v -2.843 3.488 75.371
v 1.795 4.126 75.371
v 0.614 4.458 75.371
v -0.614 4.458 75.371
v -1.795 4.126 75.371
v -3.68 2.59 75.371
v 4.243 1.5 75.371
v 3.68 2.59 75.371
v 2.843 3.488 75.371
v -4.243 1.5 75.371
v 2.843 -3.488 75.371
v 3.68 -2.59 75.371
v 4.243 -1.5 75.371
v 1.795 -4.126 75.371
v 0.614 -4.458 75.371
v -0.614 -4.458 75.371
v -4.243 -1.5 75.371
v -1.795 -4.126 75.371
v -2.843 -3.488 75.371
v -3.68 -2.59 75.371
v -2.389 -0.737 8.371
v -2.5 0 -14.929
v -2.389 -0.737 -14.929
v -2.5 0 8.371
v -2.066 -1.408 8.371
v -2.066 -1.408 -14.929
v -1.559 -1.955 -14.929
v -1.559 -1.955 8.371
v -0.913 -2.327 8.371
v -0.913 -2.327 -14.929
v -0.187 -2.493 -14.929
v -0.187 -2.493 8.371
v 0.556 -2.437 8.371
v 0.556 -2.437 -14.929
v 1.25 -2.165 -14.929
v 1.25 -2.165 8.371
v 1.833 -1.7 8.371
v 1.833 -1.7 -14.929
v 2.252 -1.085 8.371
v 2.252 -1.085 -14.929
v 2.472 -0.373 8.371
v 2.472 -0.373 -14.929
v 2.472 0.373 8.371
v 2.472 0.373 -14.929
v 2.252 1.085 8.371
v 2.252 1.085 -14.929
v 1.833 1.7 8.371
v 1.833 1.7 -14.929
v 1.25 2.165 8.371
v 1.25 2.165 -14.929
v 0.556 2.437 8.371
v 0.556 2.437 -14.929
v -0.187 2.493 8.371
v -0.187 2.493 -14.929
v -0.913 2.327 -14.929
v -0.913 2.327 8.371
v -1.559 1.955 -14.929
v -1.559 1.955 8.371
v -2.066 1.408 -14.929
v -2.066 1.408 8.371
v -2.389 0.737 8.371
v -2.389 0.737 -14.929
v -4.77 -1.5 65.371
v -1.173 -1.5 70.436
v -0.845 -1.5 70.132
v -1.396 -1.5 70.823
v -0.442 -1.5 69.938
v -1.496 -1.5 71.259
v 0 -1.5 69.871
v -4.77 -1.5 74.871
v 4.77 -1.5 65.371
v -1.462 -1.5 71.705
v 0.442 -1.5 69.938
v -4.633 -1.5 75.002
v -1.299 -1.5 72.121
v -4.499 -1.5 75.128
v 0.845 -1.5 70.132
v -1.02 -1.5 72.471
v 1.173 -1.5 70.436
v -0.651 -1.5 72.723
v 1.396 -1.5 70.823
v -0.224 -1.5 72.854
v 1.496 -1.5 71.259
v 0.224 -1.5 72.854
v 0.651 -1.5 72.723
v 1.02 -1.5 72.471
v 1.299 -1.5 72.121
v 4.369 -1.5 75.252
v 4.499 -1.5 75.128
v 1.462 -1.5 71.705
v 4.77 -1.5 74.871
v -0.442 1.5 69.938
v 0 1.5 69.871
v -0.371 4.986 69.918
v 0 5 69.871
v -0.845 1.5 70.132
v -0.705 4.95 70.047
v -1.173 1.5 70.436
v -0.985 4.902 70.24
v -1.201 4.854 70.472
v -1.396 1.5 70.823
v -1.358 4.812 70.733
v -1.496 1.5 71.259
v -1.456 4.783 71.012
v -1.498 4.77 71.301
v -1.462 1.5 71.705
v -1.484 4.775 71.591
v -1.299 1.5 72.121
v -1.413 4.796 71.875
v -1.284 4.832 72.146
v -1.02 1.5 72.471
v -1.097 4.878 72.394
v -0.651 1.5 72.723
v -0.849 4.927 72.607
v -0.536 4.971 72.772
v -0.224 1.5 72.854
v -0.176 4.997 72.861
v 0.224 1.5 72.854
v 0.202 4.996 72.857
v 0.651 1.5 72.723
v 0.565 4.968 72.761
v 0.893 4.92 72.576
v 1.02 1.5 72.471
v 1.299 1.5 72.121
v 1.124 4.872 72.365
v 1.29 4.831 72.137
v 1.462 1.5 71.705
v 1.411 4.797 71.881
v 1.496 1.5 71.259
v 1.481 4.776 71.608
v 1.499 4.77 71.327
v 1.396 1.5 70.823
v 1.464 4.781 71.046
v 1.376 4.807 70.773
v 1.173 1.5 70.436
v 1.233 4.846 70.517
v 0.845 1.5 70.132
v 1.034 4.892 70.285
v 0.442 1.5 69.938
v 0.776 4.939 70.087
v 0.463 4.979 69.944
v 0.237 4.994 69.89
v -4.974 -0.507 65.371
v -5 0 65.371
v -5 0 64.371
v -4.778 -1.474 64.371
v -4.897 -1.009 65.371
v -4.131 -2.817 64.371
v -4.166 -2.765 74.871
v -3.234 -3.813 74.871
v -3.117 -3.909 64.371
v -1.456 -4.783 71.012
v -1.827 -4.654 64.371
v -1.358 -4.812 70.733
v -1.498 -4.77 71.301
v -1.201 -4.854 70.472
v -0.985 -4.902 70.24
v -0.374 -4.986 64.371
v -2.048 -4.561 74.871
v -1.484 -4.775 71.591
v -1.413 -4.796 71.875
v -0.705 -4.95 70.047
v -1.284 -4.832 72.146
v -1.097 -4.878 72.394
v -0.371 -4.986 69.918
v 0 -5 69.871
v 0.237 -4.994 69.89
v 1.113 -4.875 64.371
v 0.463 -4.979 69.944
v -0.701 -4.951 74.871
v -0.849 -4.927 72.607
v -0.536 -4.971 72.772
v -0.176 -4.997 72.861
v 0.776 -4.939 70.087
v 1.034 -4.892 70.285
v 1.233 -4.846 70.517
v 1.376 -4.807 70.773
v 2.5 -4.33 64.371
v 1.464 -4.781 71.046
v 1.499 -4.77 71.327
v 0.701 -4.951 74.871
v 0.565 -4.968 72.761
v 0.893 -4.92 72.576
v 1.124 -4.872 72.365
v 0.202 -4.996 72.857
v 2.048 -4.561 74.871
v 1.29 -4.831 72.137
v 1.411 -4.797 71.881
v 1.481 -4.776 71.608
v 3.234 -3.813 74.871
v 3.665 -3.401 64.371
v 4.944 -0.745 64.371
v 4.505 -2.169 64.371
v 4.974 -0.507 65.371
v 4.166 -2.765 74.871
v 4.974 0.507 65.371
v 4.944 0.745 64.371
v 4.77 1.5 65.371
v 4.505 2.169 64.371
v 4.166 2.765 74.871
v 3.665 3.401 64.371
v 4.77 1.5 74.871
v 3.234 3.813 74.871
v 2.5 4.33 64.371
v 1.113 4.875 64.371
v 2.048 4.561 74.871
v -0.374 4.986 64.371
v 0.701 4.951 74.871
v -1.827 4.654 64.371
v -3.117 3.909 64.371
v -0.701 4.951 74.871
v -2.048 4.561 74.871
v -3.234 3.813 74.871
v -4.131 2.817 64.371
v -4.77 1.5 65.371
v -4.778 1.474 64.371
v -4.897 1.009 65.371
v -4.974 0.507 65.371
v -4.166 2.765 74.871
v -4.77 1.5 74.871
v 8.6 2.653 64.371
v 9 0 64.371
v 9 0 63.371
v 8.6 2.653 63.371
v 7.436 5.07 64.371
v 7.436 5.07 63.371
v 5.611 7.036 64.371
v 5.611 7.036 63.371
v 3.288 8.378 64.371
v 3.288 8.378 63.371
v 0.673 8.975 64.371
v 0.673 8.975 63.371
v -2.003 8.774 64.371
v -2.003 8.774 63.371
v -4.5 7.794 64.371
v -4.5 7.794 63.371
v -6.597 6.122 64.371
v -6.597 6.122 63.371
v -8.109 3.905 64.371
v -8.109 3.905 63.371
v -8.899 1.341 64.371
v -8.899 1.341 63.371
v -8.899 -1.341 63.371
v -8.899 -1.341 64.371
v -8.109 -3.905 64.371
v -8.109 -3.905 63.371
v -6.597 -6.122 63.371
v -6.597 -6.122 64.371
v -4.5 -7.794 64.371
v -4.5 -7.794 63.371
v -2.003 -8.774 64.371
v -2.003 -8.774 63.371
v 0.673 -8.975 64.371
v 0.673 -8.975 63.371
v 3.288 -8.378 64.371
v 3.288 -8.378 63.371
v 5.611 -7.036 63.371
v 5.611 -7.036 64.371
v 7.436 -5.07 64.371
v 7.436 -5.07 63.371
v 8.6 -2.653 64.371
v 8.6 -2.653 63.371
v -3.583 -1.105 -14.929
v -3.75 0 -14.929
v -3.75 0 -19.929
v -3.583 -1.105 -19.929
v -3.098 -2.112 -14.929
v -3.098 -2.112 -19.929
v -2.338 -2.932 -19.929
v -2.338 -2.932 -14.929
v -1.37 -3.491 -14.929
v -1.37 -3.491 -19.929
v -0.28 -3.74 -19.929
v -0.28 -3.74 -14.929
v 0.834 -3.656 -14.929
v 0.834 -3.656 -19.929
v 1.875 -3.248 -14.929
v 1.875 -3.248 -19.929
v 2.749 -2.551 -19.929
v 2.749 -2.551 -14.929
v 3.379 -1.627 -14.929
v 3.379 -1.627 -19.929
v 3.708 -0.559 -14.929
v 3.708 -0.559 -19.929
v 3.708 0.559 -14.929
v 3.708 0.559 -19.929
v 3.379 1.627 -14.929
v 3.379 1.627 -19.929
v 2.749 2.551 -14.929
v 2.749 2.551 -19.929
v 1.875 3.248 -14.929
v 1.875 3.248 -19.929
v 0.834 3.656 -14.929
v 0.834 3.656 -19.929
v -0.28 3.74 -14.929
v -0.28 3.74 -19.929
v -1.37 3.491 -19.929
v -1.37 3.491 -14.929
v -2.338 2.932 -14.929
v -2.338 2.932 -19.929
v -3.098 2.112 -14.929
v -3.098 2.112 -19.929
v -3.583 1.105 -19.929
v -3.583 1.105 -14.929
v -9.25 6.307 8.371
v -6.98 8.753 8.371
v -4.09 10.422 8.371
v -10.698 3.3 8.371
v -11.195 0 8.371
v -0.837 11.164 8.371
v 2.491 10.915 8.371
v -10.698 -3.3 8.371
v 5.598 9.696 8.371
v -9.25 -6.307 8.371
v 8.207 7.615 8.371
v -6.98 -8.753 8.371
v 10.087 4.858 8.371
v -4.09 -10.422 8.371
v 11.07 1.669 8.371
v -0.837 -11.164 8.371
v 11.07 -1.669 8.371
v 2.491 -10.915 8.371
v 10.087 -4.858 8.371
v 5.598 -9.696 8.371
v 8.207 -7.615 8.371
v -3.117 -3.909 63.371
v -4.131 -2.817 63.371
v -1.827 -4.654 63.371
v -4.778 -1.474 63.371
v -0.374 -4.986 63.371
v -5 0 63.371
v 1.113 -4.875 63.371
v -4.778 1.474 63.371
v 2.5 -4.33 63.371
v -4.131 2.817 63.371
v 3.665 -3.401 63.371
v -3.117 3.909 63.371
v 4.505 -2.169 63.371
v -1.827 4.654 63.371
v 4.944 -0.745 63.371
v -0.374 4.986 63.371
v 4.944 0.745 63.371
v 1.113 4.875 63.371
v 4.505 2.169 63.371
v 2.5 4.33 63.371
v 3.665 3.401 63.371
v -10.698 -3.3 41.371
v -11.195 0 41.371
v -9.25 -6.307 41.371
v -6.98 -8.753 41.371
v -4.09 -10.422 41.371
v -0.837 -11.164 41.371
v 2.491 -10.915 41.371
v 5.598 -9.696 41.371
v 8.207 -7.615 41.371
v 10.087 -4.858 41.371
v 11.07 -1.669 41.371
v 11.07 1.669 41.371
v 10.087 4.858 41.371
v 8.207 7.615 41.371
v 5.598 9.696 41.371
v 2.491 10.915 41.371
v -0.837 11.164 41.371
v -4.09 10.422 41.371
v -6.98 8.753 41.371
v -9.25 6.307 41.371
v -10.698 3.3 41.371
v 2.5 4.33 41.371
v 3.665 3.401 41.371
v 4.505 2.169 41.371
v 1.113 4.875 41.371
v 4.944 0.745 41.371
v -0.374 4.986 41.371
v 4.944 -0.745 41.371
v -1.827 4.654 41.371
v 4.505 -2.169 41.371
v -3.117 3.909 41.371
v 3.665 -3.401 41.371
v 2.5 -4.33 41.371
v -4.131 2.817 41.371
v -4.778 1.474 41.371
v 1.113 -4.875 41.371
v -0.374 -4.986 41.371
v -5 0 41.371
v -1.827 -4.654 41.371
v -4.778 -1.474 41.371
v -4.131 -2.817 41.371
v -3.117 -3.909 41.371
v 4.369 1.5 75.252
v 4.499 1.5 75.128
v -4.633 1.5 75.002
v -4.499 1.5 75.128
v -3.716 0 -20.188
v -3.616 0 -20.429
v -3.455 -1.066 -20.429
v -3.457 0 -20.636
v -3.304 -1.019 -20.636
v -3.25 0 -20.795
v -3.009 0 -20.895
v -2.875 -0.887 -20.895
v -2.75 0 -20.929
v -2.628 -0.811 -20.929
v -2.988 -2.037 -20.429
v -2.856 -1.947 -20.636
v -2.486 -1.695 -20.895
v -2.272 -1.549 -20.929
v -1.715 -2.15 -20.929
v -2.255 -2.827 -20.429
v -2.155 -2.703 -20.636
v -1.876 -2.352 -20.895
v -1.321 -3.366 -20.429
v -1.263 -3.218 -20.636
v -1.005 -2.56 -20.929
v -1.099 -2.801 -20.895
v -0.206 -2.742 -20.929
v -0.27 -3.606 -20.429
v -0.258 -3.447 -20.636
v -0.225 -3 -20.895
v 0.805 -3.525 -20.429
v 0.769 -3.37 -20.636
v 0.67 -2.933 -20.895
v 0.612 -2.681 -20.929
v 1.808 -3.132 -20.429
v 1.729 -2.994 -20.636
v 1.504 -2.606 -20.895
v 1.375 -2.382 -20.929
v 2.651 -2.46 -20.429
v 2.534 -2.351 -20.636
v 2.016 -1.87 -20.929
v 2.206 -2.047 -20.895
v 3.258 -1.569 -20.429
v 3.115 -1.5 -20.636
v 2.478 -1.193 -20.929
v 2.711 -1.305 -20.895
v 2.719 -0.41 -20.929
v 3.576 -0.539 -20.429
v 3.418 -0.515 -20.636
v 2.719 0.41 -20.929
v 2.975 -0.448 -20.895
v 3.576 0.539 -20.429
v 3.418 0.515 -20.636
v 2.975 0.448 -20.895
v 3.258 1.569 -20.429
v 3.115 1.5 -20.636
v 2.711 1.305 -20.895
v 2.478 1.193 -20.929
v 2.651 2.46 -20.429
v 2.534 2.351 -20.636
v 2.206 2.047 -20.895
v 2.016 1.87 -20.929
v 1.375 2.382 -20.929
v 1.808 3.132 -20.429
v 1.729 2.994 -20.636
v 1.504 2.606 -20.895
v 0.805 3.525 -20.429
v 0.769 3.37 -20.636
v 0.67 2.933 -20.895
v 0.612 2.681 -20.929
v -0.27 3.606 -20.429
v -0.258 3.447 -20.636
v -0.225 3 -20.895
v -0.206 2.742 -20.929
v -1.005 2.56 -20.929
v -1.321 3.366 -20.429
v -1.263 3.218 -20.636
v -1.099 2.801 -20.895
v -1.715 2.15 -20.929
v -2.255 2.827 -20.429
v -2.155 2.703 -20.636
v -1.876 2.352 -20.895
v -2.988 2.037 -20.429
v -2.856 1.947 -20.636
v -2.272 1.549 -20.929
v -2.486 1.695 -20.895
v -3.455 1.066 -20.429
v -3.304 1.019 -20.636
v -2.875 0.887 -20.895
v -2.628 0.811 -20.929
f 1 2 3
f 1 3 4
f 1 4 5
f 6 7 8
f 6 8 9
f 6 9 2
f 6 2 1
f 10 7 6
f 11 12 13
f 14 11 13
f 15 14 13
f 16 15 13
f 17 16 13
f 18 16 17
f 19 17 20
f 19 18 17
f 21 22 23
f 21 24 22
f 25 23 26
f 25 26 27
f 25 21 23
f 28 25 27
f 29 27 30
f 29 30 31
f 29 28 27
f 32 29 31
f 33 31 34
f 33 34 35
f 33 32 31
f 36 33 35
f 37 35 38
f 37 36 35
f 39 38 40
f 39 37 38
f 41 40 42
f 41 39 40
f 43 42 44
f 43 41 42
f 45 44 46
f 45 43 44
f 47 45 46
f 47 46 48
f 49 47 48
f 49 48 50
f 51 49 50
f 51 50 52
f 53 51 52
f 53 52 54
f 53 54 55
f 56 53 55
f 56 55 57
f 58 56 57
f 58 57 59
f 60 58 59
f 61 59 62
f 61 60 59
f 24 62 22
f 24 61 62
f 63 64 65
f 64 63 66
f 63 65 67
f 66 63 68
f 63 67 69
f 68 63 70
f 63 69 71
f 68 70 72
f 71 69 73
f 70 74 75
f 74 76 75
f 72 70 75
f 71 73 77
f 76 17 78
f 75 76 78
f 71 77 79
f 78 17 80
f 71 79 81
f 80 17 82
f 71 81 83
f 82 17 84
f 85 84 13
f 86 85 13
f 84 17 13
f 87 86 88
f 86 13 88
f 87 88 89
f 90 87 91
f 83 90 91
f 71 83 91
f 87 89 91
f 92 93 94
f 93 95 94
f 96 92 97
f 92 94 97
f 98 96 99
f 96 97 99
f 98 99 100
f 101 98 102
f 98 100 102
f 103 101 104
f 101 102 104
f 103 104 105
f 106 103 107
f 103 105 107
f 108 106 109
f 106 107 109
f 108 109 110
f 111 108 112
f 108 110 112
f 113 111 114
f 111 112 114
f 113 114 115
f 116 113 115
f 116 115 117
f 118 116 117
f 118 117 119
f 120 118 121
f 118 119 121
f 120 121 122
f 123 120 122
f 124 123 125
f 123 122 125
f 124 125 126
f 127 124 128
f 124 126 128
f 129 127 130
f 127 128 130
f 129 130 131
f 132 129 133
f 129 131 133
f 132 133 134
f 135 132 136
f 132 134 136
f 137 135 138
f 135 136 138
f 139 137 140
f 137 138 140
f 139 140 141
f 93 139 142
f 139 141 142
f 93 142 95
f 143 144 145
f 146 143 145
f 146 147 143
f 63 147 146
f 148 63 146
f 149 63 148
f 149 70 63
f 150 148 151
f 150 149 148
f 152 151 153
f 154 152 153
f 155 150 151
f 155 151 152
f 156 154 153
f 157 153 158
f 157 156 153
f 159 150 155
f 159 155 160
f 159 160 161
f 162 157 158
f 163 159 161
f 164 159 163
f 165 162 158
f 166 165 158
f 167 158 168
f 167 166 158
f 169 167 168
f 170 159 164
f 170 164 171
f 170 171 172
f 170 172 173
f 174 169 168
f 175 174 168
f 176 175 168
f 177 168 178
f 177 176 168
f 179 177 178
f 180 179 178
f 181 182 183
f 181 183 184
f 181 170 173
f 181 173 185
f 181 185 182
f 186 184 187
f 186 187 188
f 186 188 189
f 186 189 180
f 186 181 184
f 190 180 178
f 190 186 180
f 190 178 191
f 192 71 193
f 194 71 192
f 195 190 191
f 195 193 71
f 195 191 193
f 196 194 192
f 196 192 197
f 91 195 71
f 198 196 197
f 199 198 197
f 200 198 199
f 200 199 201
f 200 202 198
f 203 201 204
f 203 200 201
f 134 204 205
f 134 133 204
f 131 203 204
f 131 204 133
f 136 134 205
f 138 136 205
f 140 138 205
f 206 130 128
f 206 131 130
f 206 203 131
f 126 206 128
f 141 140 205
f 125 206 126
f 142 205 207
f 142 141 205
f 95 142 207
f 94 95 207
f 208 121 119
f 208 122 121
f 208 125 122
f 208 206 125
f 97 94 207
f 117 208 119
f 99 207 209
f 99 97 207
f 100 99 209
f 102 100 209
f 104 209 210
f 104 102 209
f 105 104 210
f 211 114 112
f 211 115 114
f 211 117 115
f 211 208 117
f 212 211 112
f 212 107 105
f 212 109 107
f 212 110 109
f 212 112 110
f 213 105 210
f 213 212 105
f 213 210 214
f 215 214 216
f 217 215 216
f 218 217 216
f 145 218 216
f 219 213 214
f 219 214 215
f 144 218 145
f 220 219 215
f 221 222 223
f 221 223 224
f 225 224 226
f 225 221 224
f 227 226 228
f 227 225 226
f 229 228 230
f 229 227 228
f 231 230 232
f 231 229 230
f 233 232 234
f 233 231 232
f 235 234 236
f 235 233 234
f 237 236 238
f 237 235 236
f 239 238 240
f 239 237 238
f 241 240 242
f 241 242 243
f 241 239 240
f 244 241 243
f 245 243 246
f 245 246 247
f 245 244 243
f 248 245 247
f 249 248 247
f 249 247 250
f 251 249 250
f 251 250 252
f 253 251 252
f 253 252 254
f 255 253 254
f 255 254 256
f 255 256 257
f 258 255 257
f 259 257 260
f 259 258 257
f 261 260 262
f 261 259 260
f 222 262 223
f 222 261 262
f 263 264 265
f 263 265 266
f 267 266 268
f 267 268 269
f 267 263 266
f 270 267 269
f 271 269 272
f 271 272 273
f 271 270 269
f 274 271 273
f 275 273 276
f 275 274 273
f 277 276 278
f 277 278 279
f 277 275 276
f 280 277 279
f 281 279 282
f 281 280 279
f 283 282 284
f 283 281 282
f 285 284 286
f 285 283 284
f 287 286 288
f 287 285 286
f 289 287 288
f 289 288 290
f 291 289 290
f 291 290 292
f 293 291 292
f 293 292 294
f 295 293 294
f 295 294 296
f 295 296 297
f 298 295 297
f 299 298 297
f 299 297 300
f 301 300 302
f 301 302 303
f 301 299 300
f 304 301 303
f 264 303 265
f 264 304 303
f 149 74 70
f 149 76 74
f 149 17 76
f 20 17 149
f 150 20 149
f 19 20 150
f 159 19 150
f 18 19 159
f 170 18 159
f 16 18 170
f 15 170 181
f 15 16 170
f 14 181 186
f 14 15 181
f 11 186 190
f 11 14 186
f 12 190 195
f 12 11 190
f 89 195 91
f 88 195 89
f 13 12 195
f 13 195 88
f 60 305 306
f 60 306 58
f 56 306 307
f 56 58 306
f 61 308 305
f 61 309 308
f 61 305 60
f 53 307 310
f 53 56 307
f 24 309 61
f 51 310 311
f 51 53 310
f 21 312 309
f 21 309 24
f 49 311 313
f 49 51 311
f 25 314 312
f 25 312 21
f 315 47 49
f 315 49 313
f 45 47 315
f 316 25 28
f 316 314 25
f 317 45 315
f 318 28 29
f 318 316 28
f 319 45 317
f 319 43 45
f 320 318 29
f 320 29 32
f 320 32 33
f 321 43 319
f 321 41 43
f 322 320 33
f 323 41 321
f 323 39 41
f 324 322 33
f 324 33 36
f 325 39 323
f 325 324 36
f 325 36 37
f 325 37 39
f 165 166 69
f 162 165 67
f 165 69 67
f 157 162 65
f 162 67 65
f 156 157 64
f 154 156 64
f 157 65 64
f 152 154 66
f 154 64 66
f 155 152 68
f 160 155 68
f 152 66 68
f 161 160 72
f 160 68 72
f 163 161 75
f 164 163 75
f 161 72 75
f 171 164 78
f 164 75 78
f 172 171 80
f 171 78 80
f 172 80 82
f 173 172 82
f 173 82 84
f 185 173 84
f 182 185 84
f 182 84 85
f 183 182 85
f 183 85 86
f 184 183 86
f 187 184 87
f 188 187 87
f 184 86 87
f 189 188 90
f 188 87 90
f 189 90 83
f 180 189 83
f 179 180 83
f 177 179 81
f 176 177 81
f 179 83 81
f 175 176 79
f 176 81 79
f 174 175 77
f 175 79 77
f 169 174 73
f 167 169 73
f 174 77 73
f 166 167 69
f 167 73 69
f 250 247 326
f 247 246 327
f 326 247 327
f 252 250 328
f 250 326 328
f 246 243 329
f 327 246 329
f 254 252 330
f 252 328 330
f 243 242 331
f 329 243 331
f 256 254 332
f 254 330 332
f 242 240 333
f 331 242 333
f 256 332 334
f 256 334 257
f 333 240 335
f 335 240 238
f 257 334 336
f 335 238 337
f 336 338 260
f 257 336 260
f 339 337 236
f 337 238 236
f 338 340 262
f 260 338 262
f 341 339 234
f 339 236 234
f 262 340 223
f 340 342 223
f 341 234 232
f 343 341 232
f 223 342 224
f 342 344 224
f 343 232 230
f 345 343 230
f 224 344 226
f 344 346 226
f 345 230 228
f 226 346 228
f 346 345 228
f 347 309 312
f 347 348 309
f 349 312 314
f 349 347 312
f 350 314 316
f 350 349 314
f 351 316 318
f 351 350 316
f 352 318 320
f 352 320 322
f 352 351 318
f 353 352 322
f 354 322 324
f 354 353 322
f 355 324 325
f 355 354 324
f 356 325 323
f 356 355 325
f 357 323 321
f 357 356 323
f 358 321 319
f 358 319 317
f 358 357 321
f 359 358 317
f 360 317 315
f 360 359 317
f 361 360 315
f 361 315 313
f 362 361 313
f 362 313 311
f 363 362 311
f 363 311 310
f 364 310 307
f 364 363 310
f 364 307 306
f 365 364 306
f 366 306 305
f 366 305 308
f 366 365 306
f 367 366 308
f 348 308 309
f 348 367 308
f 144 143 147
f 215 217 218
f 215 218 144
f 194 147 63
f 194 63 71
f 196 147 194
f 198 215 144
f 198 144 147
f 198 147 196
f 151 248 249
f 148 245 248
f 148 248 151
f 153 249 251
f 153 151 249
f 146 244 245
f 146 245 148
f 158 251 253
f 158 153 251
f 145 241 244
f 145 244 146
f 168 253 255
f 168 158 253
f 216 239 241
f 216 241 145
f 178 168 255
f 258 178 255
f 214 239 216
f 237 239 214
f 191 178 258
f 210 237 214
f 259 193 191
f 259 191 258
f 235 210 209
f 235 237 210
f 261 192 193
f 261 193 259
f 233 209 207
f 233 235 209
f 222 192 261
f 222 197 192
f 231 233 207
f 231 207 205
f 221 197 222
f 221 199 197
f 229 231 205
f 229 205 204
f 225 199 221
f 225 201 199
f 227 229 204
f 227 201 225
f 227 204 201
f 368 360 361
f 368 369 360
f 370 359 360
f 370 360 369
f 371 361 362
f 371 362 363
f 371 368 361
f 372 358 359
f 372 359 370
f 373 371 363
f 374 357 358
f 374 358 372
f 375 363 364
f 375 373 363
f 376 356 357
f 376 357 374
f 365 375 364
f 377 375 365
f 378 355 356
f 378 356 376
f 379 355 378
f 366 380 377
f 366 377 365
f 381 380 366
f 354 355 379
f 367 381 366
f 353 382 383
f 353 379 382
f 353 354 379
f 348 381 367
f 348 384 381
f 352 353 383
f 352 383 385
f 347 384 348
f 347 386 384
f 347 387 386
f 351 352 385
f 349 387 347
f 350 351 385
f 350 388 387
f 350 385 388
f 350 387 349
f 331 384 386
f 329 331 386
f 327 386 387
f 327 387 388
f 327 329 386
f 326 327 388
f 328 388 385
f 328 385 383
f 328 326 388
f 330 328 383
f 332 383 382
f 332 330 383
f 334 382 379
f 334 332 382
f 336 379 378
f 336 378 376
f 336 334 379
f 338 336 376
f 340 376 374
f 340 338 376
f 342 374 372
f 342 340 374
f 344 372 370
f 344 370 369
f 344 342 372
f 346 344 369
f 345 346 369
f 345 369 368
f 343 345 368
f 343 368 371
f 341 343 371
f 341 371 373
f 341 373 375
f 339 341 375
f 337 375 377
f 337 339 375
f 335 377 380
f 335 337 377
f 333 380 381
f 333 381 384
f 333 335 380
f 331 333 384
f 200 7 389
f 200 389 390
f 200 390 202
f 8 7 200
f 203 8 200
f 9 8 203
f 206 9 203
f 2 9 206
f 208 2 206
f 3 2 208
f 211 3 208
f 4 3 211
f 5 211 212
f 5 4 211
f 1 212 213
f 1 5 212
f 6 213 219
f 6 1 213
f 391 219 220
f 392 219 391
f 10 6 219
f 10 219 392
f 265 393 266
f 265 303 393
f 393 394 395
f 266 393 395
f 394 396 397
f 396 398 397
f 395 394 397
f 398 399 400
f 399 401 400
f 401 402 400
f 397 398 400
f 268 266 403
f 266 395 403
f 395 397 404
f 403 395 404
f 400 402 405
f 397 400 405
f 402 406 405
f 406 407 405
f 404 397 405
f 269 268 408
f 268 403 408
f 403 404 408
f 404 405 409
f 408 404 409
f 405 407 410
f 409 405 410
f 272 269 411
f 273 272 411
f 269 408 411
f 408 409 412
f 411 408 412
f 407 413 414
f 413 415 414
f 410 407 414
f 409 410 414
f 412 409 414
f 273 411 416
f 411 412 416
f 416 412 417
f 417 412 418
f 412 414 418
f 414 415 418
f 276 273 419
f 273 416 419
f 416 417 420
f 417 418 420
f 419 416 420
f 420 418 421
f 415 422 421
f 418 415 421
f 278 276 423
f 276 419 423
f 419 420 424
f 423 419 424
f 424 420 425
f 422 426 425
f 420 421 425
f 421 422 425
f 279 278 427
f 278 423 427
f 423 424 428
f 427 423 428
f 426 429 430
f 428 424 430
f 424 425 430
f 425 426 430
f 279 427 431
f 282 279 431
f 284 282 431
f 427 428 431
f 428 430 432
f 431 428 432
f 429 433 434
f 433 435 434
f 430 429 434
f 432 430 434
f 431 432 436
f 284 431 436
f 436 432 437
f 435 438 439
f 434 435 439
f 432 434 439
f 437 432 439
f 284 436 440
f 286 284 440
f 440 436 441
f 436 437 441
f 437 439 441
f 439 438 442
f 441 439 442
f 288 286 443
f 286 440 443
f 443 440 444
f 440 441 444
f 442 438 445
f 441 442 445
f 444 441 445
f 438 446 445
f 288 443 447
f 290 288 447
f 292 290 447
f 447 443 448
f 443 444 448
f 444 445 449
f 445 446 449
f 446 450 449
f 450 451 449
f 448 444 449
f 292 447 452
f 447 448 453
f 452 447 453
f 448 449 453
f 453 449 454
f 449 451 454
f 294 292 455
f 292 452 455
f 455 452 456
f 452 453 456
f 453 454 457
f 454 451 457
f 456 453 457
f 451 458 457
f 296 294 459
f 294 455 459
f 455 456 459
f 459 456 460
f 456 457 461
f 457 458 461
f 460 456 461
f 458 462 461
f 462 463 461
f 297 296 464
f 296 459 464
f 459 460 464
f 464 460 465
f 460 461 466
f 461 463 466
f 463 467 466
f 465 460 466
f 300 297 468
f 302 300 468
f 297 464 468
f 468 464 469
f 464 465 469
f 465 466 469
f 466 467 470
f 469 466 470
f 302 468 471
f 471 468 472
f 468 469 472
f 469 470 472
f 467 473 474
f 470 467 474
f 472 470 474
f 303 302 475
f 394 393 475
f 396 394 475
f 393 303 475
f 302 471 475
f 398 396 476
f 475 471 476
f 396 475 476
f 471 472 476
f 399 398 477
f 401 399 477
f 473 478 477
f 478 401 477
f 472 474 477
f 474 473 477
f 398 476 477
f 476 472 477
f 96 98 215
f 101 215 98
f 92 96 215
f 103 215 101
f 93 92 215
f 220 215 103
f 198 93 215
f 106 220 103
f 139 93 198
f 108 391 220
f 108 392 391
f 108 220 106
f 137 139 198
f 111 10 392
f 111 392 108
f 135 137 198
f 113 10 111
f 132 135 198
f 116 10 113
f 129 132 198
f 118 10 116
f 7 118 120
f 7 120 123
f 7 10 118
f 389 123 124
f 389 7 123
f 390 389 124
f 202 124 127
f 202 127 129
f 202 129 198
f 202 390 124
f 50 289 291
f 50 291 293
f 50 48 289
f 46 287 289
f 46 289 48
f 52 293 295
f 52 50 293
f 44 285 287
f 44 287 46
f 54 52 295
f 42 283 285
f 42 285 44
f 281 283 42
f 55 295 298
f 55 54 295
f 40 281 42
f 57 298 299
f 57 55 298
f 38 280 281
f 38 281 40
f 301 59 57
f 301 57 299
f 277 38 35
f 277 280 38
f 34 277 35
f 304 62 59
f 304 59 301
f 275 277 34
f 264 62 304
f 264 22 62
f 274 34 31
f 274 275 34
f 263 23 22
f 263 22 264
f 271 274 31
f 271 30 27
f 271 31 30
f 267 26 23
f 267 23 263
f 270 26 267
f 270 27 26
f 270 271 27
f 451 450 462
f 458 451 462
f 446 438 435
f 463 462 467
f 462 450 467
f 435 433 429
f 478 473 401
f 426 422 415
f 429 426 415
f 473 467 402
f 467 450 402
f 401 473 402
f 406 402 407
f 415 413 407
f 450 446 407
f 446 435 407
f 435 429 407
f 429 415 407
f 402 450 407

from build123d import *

# Parameters (mm, degrees)
CHAMFER_1_SIZE      = 0.5
SKETCH_3_W          = 16
SKETCH_3_H          = 3
CUT_EXTRUDE_1_DEPTH = 10
SKETCH_4_R          = 1.5
CUT_EXTRUDE_2_DEPTH = 11
FILLET_1_R          = 1
SKETCH_5_R          = 9
EXTRUDE_1_DEPTH     = 1


with BuildPart() as part:
    # 草图1 → 旋转1 (revolve)
    with BuildSketch(Plane(origin=(0, 0, 0), x_dir=(1, 0, 0), z_dir=(0, 1, 0)), mode=Mode.PRIVATE) as revolve_1_sk:
        Polygon((2.5, 14.928900778), (2.5, -8.371099222), (11.195443228, -8.371099222), (11.195443228, -41.371099222), (5, -41.371099222), (5, -75.371099222), (0, -75.371099222), (0, 20.928900778), (2.5, 20.928900778), (3.75, 20.928900778), (3.75, 14.928900778), align=None)
    revolve(revolve_1_sk.sketch.rotate(Axis((0, 0, -46.113181398), (0, 0, 1)), 180), axis=Axis((0, 0, -46.113181398), (0, 0, 1)))

    # 倒角1
    chamfer_1_edges = [part.edges().sort_by_distance(p)[0] for p in [
        (5, 0, 75.371099222),
    ]]
    chamfer(chamfer_1_edges, length=CHAMFER_1_SIZE)

    # 草图3 → 切除-拉伸1 (cut)
    with BuildSketch(Plane.XY.offset(75.371099222)):
        Rectangle(SKETCH_3_W, SKETCH_3_H)
    extrude(amount=-CUT_EXTRUDE_1_DEPTH, mode=Mode.SUBTRACT)

    # 草图4 → 切除-拉伸2 (cut, symmetric)
    with BuildSketch(Plane(origin=(0, 0, 0), x_dir=(1, 0, 0), z_dir=(0, 1, 0))):
        with Locations(Location((0, -71.371099222, 0), (0, 0, 90))):
            Circle(SKETCH_4_R)
    extrude(amount=CUT_EXTRUDE_2_DEPTH, both=True, mode=Mode.SUBTRACT)

    # 圆角1
    fillet_1_edges = [part.edges().sort_by_distance(p)[0] for p in [
        (3.75, 0, -20.928900778),
    ]]
    fillet(fillet_1_edges, radius=FILLET_1_R)

    # 草图5 → 凸台-拉伸1 (add)
    with BuildSketch(Plane.XY.offset(64.371099222)):
        Circle(SKETCH_5_R)
    extrude(amount=-EXTRUDE_1_DEPTH)


solid = part.part
